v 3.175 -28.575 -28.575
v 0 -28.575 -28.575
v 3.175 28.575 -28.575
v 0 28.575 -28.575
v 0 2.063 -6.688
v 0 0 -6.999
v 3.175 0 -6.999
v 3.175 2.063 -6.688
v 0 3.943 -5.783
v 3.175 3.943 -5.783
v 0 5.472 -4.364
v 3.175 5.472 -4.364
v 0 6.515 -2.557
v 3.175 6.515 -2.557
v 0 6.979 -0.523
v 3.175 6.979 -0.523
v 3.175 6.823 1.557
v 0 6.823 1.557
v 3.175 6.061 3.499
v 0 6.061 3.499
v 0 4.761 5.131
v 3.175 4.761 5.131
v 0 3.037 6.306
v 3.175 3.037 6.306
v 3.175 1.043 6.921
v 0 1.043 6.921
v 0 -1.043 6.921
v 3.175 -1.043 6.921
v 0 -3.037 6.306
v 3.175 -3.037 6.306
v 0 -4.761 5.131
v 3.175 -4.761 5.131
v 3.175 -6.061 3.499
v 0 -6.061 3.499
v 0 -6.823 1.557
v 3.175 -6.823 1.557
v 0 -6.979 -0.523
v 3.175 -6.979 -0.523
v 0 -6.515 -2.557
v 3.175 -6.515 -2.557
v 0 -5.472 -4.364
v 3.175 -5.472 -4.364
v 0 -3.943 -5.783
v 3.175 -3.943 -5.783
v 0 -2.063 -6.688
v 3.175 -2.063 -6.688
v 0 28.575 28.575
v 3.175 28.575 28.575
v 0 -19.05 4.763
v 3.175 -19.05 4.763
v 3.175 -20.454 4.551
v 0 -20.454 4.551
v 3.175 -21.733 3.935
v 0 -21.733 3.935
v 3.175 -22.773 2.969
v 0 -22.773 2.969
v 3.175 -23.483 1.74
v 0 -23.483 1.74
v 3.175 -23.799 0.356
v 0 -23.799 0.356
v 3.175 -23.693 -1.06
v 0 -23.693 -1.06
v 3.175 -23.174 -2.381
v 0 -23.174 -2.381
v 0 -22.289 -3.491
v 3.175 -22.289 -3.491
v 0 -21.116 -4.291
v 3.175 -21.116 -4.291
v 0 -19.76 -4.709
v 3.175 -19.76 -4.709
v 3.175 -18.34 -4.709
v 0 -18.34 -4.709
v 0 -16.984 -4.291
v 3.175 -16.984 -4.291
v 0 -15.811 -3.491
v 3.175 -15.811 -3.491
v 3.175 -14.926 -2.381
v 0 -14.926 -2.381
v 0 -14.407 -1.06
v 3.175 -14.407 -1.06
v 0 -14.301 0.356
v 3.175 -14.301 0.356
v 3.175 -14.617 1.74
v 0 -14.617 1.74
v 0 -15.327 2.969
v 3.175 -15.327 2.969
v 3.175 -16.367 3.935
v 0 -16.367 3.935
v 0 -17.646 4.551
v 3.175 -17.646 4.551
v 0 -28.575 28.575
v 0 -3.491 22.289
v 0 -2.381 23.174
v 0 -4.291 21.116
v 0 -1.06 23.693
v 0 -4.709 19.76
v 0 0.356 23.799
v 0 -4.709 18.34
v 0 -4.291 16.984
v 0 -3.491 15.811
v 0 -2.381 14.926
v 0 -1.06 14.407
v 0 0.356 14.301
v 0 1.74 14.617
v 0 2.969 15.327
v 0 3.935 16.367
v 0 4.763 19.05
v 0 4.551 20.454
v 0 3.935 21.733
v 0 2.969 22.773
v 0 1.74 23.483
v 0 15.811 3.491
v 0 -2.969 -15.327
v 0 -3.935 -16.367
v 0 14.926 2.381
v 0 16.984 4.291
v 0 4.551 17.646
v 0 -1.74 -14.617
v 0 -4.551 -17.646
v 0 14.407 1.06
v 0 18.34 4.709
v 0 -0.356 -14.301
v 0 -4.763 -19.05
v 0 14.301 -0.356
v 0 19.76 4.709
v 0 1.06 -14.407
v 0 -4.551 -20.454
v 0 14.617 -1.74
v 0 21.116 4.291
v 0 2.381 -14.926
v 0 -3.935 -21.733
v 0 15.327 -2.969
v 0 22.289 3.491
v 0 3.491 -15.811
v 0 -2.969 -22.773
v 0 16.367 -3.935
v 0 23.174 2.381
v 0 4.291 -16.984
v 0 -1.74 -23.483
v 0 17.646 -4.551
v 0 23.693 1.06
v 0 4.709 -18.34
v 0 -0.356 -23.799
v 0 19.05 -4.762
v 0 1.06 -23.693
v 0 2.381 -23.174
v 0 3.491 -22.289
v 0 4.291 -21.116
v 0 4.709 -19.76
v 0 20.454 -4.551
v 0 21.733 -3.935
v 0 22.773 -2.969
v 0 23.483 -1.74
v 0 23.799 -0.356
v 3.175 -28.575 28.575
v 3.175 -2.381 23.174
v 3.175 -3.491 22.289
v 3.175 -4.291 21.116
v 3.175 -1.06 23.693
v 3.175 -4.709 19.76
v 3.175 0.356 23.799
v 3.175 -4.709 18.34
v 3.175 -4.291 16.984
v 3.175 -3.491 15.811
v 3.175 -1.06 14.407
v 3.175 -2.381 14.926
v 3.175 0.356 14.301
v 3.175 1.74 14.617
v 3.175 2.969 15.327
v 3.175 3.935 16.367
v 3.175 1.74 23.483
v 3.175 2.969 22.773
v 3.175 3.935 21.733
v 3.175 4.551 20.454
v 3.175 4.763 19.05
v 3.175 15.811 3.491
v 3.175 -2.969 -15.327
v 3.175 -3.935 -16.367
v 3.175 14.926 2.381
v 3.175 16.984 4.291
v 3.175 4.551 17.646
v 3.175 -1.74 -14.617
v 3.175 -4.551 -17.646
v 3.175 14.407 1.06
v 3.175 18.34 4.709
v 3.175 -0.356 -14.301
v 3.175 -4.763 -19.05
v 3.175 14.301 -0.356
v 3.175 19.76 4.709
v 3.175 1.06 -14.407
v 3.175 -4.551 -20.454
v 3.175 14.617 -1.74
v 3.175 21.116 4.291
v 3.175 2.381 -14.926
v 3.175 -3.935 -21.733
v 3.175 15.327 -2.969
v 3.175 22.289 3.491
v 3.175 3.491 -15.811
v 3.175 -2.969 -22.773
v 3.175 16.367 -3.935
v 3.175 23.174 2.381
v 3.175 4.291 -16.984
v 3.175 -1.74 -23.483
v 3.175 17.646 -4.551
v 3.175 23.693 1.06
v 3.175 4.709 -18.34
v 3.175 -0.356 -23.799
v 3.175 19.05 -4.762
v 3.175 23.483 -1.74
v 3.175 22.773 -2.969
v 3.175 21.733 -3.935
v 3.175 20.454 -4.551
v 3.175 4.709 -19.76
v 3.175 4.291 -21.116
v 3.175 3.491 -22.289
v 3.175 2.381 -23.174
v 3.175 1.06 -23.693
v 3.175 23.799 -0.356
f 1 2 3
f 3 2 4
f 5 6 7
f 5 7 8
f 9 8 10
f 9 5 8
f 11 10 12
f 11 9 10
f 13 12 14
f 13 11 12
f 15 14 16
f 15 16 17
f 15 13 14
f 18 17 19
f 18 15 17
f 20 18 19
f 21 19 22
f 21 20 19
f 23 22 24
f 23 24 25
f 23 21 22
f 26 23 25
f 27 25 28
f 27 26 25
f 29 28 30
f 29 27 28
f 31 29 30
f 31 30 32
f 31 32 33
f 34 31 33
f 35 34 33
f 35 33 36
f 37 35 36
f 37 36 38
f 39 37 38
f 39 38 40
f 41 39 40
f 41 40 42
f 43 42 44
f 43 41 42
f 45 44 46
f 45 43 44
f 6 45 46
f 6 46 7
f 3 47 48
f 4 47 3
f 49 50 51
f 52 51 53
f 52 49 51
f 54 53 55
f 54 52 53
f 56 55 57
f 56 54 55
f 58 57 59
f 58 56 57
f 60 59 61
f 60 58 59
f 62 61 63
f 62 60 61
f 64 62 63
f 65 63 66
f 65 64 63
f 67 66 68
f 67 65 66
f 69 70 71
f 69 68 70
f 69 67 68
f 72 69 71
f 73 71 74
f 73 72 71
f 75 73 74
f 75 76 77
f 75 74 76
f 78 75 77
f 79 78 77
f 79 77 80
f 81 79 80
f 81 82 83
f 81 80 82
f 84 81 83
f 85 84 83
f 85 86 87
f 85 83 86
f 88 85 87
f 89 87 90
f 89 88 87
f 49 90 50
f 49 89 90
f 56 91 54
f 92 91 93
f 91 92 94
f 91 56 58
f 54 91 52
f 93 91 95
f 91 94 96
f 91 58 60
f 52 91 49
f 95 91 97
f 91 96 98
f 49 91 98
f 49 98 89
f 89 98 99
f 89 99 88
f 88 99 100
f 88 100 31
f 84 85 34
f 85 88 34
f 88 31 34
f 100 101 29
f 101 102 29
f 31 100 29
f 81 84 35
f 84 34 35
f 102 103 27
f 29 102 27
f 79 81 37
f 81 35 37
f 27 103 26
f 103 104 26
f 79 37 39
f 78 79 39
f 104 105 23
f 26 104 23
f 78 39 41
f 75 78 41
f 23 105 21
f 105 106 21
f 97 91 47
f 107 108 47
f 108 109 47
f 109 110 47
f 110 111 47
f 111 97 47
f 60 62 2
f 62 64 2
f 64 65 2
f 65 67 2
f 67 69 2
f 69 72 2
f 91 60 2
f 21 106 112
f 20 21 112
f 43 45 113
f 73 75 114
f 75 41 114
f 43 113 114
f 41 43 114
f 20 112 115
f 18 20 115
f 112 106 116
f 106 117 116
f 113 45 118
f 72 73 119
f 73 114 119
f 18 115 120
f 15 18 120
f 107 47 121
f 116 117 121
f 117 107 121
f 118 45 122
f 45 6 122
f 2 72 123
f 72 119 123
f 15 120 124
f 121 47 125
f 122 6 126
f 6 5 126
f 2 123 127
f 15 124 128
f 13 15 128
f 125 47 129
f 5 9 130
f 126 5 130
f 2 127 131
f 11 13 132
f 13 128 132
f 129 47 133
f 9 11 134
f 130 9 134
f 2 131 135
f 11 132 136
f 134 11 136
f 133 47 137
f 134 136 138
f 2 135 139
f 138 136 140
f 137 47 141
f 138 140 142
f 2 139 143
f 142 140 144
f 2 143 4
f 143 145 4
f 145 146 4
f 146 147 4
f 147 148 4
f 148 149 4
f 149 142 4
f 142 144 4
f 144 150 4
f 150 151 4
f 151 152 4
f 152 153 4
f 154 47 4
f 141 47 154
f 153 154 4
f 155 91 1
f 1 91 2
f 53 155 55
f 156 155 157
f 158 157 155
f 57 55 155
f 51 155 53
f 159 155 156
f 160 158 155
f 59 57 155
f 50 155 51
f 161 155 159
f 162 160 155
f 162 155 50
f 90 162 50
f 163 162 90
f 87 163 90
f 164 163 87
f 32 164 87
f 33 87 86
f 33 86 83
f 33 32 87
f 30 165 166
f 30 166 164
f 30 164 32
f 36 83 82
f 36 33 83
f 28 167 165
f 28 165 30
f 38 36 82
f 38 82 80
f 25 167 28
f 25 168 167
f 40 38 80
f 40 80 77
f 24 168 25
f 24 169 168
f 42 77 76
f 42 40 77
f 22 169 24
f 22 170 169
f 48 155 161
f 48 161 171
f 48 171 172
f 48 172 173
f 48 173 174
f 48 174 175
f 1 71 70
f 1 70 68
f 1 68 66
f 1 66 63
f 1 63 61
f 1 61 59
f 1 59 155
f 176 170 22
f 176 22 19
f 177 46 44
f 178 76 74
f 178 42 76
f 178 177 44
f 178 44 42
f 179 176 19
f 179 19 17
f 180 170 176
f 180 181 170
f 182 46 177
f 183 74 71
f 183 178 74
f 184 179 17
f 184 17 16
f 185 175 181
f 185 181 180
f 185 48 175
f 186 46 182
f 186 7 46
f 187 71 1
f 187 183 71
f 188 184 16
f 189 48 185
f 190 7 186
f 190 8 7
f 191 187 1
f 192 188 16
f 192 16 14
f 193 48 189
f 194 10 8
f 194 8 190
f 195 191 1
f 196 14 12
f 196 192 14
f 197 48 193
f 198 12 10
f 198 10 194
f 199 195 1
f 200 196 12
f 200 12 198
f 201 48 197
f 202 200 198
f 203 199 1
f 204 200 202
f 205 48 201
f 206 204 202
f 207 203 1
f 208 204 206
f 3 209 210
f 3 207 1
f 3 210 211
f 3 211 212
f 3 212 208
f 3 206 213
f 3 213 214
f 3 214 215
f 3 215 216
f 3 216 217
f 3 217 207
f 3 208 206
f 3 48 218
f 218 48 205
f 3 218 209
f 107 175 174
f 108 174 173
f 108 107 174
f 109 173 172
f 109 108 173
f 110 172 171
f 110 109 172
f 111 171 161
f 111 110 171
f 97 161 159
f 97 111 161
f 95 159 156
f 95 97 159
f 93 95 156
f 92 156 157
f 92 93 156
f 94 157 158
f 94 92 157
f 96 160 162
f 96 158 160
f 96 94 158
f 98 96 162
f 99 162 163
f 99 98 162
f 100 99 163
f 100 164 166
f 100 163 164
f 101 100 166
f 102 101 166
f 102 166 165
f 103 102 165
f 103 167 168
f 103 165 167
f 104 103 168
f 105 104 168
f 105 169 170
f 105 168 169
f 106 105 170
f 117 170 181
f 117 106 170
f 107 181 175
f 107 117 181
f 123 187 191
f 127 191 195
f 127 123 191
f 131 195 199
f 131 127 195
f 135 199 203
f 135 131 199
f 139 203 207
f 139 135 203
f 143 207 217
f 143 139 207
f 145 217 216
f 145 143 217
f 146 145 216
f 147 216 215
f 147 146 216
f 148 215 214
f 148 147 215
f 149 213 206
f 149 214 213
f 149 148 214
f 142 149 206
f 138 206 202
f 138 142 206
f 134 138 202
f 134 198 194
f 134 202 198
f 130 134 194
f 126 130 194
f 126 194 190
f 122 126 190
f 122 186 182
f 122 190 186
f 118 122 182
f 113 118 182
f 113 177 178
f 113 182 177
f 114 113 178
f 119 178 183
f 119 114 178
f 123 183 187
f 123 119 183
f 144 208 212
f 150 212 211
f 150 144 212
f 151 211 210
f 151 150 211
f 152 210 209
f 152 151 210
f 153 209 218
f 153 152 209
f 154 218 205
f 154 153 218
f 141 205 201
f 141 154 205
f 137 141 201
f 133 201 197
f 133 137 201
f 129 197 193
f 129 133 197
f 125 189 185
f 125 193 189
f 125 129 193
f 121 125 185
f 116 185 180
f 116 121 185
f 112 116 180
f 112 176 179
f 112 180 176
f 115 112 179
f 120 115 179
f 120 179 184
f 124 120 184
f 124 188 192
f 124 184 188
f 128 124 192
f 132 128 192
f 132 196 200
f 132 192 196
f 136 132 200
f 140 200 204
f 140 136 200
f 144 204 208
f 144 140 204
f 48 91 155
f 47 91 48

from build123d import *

# Parameters (mm, degrees)
SKETCH1_W           = 57.15
SKETCH1_H           = 57.15
SKETCH1_R           = 6.99897
BOSS_EXTRUDE1_DEPTH = 3.175
SKETCH2_R           = 4.7625
CUT_EXTRUDE1_DEPTH  = 41.535686438
CIRPATTERN1_COUNT   = 4


with BuildPart() as part:
    # Sketch1 → Boss-Extrude1 (new body)
    with BuildSketch(Plane(origin=(0, 0, 0), x_dir=(0, 0, -1), z_dir=(1, 0, 0))):
        Rectangle(SKETCH1_W, SKETCH1_H)
        Circle(SKETCH1_R, mode=Mode.SUBTRACT)
    extrude(amount=BOSS_EXTRUDE1_DEPTH)

    # Sketch2 → Cut-Extrude1 (cut, through all)
    with BuildSketch(Plane(origin=(0, 0, 0), x_dir=(0, 0, -1), z_dir=(1, 0, 0))):
        with Locations((0, 19.05)):
            Circle(SKETCH2_R)
    cut_extrude1 = extrude(amount=CUT_EXTRUDE1_DEPTH, mode=Mode.SUBTRACT)

    # CirPattern1: Cut-Extrude1 ×4 about axis
    cirpattern1_axis = Axis((0, 0, 0), (1, 0, 0))
    for i in range(1, CIRPATTERN1_COUNT):
        add(cut_extrude1.rotate(cirpattern1_axis, i * 360 / CIRPATTERN1_COUNT), mode=Mode.SUBTRACT)


solid = part.part
